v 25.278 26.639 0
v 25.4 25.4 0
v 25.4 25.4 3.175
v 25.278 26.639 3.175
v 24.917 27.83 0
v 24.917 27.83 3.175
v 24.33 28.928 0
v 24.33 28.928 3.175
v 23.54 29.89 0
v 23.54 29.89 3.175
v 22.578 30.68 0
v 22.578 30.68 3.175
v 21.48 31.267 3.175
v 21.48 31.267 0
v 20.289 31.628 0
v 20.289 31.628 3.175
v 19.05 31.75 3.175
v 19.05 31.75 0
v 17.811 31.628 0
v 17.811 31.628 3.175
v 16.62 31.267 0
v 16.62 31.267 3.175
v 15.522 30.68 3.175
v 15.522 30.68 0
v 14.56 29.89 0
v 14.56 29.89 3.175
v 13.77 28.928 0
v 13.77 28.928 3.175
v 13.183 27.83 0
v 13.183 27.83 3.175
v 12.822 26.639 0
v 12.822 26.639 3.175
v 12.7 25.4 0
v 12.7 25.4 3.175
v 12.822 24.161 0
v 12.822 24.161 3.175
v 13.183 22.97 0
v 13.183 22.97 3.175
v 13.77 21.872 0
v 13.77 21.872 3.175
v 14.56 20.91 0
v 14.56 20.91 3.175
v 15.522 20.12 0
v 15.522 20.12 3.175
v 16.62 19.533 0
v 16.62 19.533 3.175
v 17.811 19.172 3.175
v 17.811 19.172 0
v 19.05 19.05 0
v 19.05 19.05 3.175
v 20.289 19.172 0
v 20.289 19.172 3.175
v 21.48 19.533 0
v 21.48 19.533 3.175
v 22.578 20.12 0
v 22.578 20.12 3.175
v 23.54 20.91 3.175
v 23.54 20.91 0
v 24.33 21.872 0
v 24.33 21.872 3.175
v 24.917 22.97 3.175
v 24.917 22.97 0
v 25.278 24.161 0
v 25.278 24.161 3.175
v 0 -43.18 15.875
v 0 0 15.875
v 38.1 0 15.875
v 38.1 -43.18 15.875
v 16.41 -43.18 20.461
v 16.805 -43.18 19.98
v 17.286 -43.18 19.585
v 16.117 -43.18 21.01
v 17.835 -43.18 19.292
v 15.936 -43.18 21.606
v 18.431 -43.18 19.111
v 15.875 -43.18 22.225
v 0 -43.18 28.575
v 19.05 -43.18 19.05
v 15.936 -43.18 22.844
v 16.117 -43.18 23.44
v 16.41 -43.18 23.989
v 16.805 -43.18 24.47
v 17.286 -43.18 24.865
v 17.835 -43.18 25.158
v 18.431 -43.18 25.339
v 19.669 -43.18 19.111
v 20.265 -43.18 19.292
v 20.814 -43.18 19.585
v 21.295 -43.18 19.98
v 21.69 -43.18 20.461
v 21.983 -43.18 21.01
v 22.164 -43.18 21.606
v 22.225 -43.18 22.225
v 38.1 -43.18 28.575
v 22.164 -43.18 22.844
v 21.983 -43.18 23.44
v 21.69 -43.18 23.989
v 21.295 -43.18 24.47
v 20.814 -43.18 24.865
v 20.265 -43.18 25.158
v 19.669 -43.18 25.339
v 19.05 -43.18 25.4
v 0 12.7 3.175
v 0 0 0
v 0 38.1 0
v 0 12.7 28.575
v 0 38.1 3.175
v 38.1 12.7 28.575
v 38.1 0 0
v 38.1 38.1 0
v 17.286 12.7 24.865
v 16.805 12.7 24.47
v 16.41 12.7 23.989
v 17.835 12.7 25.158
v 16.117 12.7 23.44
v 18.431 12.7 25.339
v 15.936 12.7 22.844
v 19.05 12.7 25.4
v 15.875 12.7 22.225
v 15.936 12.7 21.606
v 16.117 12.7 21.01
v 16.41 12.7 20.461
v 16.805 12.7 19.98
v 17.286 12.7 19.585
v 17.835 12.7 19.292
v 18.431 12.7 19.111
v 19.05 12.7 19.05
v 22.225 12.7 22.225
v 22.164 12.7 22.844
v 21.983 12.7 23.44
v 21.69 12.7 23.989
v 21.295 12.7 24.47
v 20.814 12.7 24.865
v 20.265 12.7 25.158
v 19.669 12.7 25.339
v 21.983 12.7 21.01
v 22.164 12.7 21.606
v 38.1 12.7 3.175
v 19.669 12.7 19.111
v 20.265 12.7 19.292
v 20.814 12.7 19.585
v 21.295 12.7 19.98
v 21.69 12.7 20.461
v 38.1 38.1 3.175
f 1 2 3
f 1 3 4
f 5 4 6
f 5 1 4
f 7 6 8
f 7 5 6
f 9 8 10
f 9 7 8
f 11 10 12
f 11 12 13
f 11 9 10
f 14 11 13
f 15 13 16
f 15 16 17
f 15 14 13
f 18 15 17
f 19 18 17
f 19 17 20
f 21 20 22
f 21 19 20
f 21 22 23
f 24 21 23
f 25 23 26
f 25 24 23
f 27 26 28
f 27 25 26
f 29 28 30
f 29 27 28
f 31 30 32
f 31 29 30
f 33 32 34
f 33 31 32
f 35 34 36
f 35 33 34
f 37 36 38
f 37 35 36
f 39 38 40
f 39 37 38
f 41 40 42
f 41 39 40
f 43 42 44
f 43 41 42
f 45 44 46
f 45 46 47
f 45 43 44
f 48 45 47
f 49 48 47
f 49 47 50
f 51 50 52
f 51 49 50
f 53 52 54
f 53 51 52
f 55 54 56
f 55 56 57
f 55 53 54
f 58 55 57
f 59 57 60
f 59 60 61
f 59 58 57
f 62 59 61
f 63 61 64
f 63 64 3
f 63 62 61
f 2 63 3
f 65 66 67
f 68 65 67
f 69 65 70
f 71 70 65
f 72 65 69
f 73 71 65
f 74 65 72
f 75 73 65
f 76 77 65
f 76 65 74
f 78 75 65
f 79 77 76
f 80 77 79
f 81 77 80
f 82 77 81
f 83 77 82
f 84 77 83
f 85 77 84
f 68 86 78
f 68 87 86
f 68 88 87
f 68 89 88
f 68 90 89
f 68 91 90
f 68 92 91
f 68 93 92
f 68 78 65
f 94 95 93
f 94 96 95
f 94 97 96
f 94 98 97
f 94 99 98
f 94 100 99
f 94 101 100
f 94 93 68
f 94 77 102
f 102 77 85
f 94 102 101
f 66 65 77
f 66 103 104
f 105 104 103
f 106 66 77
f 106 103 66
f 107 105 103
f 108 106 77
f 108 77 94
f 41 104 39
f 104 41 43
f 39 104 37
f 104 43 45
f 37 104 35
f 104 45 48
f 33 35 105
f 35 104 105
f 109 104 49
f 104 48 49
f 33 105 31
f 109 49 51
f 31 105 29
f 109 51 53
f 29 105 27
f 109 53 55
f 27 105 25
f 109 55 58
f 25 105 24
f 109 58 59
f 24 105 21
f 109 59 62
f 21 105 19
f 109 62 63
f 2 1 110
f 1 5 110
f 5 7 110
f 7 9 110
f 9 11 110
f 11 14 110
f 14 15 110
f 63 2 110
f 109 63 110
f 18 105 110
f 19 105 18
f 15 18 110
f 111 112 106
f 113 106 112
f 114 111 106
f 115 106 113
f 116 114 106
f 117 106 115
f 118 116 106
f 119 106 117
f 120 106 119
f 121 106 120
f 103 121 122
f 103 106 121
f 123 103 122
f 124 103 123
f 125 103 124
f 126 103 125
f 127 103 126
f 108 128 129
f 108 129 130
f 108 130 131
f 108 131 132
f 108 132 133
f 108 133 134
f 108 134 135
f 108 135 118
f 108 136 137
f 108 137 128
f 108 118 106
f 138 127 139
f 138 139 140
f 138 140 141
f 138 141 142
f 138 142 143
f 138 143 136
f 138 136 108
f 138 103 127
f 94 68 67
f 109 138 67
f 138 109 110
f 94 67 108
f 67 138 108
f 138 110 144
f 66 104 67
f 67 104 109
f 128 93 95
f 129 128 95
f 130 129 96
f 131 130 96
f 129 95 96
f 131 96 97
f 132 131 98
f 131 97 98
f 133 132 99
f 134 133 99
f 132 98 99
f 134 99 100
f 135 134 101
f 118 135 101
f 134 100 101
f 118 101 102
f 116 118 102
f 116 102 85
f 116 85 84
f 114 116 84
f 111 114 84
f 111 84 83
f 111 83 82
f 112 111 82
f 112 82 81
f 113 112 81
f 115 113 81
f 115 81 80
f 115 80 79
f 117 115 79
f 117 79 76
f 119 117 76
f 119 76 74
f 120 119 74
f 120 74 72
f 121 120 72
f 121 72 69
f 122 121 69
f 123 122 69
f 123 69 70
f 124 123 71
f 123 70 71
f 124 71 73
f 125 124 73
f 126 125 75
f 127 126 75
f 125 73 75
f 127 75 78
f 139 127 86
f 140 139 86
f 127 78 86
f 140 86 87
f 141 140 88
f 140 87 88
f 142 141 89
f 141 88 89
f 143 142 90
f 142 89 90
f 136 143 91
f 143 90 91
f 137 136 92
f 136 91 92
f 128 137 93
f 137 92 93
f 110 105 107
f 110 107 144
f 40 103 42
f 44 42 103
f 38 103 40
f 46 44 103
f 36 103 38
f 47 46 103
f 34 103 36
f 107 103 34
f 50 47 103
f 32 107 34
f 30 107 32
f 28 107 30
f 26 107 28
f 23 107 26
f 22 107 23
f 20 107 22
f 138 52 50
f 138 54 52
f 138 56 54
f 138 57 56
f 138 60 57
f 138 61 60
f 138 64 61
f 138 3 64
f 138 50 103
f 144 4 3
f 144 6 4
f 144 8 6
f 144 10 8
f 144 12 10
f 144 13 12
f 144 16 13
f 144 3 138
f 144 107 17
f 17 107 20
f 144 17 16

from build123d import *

# Parameters (mm, degrees)
F0_W     = 38.1
F0_H     = 38.1
F0_R     = 6.35
F1_DEPTH = 3.175
F2_W     = 38.1
F2_H     = 12.7
F3_DEPTH = 25.4
F4_W     = 38.1
F4_H     = 12.7
F5_DEPTH = 43.18
F6_R     = 3.175
F7_DEPTH = 81.281


with BuildPart() as f1:
    # F0 (on Top) → F1 (new body)
    with BuildSketch(Plane.XY):
        with Locations((19.05, 19.05)):
            Rectangle(F0_W, F0_H)
        with Locations((19.05, 25.4)):
            Circle(F0_R, mode=Mode.SUBTRACT)
    extrude(amount=F1_DEPTH)

    # F2 (on face) → F3 (join)
    with BuildSketch(Plane.XY.offset(3.175)):
        with Locations((19.05, 6.35)):
            Rectangle(F2_W, F2_H)
    extrude(amount=F3_DEPTH)

    # F4 (on face) → F5 (join)
    with BuildSketch(Plane.XZ):
        with Locations((19.05, 22.225)):
            Rectangle(F4_W, F4_H)
    extrude(amount=F5_DEPTH)

    # F6 (on face) → F7 (cut, through all)
    with BuildSketch(Plane.XZ.offset(43.18)):
        with Locations((19.05, 22.225)):
            Circle(F6_R)
    extrude(amount=-F7_DEPTH, mode=Mode.SUBTRACT)


solid = f1.part
